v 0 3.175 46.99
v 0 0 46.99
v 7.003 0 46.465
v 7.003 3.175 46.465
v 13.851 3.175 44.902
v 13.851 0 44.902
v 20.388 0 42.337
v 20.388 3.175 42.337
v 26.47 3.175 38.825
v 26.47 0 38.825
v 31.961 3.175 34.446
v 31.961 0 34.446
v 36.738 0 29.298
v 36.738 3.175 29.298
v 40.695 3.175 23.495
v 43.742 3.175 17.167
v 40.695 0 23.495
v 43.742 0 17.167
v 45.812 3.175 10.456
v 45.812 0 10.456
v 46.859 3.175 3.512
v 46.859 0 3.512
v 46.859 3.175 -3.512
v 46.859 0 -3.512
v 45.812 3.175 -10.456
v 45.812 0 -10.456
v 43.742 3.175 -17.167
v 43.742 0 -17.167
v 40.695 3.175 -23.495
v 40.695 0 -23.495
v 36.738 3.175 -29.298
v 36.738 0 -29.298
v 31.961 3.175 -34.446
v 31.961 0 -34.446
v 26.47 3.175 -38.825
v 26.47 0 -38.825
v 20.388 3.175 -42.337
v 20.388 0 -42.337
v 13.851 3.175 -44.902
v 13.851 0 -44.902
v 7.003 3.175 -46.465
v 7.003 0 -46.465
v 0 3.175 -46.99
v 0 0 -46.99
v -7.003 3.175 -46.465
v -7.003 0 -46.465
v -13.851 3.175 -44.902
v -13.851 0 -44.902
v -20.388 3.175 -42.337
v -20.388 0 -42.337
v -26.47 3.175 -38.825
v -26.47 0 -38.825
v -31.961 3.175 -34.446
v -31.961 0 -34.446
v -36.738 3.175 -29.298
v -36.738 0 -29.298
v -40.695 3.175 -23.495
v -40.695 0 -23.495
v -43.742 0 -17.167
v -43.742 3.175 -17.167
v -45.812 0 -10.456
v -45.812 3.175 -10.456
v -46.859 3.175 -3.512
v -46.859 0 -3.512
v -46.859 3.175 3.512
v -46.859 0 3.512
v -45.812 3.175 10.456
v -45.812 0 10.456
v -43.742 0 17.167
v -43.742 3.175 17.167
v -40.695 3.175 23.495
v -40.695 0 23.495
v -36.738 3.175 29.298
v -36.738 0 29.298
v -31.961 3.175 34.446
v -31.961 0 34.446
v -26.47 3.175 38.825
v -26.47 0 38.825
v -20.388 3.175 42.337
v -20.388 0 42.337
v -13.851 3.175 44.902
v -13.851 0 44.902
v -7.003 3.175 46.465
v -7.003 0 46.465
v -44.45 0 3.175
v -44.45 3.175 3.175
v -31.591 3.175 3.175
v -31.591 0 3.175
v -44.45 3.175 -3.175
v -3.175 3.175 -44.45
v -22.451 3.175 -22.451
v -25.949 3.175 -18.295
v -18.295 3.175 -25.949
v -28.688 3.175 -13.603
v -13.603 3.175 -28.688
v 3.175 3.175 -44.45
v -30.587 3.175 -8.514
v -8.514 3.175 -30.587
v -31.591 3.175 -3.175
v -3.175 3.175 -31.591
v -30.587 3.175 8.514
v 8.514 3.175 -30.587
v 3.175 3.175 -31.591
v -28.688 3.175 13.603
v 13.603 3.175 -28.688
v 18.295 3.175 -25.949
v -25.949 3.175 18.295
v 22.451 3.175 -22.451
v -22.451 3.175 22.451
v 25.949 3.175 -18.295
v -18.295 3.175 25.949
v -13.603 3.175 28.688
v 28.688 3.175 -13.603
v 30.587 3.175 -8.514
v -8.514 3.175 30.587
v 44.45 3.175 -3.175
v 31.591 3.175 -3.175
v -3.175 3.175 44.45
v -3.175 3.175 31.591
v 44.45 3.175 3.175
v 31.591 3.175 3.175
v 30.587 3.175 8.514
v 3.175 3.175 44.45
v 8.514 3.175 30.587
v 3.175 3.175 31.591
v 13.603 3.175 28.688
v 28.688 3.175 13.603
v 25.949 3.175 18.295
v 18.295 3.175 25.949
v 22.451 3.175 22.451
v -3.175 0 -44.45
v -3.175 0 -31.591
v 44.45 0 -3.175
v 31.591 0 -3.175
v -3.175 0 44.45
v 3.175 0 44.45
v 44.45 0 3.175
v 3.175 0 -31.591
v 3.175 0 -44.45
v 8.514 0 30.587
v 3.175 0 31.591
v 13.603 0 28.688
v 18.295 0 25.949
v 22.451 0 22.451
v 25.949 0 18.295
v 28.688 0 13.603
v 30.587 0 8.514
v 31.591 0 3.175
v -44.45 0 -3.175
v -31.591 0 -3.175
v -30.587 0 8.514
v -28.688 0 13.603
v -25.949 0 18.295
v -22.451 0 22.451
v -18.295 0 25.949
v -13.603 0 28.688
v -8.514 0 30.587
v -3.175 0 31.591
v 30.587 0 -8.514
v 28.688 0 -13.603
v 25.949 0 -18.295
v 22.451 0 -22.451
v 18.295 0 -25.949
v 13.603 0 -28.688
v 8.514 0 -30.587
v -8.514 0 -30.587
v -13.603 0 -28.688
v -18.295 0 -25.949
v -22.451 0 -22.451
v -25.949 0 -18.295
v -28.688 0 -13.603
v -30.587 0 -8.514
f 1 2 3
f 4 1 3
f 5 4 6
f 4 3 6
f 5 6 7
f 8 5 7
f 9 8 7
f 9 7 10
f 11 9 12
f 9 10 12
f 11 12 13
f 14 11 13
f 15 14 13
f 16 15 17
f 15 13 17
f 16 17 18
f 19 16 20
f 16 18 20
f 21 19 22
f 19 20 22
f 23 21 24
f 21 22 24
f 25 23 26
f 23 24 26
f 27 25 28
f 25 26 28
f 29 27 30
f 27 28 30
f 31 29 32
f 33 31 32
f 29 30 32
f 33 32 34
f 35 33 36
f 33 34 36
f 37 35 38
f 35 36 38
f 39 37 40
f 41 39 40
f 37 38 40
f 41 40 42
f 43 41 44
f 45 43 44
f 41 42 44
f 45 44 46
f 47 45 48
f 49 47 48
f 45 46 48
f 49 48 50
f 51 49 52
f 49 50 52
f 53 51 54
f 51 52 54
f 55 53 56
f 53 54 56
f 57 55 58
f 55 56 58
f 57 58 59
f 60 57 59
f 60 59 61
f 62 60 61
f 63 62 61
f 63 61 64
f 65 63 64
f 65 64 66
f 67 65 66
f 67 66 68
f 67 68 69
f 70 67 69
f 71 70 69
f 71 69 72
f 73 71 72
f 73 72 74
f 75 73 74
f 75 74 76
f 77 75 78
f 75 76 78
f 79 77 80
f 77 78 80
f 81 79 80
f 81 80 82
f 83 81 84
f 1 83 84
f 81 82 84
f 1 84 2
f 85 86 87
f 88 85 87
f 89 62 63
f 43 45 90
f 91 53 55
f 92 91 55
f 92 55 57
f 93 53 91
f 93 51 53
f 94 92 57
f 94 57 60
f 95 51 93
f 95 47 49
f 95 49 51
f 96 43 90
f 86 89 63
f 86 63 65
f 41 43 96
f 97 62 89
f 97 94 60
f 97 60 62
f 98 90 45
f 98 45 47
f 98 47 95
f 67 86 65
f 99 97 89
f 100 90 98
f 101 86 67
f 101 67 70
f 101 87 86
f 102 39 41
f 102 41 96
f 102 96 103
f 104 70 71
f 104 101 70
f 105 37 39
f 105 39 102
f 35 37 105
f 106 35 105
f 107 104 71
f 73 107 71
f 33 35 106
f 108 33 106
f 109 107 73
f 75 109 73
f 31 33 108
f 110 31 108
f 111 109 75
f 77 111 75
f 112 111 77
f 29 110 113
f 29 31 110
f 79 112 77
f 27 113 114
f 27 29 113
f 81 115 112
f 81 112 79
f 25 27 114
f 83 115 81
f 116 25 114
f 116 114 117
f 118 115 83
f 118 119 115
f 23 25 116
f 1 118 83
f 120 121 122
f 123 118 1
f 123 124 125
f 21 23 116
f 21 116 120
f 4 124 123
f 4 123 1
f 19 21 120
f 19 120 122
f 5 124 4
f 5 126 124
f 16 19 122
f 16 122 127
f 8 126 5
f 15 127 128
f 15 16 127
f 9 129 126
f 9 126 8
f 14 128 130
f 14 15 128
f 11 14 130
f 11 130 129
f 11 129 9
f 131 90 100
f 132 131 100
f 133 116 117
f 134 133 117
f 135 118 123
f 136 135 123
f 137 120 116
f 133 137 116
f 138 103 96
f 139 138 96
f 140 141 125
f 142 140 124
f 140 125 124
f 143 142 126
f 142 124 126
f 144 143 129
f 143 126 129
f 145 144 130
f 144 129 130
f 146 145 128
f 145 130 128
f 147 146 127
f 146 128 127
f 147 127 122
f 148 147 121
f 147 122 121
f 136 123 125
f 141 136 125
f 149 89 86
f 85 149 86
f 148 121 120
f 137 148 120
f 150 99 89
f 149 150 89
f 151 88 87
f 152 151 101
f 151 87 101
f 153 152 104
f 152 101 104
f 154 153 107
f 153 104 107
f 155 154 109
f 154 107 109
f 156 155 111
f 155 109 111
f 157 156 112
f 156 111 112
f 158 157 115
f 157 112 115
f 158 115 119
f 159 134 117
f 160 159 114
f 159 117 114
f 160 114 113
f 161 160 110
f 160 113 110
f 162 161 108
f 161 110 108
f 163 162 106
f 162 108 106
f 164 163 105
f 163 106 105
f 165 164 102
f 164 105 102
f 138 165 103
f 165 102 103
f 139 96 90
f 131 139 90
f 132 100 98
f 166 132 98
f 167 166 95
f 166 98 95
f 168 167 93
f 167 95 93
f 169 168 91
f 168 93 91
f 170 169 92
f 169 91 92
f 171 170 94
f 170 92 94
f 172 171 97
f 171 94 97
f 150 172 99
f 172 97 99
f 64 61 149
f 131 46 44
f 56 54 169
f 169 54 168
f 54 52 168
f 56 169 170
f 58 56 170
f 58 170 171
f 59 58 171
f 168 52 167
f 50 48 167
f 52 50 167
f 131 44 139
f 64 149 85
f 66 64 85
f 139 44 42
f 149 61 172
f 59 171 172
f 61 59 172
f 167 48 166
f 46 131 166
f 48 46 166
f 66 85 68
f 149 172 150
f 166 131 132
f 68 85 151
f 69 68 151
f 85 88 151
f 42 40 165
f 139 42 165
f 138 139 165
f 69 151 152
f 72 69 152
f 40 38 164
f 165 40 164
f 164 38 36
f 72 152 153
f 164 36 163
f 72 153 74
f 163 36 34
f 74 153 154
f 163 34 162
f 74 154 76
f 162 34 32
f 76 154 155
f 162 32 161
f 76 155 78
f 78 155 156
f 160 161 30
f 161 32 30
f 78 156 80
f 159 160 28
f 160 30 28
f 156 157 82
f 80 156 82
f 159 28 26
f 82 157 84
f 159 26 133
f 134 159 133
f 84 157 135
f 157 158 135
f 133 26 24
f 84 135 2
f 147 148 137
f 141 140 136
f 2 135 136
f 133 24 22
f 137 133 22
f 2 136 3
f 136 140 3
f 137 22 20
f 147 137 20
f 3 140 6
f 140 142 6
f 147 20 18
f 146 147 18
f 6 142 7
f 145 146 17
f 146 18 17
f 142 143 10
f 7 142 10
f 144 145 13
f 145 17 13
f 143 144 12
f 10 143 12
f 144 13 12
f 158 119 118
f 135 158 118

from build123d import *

# Parameters (mm, degrees)
SKETCH1_R           = 46.99
BOSS_EXTRUDE1_DEPTH = 3.175
SKETCH2_R           = 14.351
CUT_EXTRUDE1_DEPTH  = 3.175
CUT_EXTRUDE2_DEPTH  = 7.62
SKETCH6_R           = 31.75
CUT_EXTRUDE3_DEPTH  = 5.08


with BuildPart() as part:
    # Sketch1 → Boss-Extrude1 (new body)
    with BuildSketch(Plane(origin=(0, 0, 0), x_dir=(1, 0, 0), z_dir=(0, 1, 0))):
        with Locations(Location((0, 0, 0), (0, 0, 270))):
            Circle(SKETCH1_R)
    extrude(amount=BOSS_EXTRUDE1_DEPTH)

    # Sketch2 → Cut-Extrude1 (cut)
    with BuildSketch(Plane(origin=(0, 3.175, 0), x_dir=(1, 0, 0), z_dir=(0, 1, 0))):
        with Locations(Location((0, 0, 0), (0, 0, 270))):
            Circle(SKETCH2_R)
    extrude(amount=-CUT_EXTRUDE1_DEPTH, mode=Mode.SUBTRACT)

    # Sketch5 → Cut-Extrude2 (cut)
    with BuildSketch(Plane(origin=(0, 3.175, 0), x_dir=(1, 0, 0), z_dir=(0, 1, 0))):
        with BuildLine():
            Line((3.175, 13.995376951), (3.175, 44.45))
            Line((3.175, 44.45), (-3.175, 44.45))
            Line((-3.175, 44.45), (-3.175, 13.995376951))
            ThreePointArc((-3.175, 13.995376951), (0, 14.351), (3.175, 13.995376951))
        make_face()
        with BuildLine():
            Line((3.175, -44.45), (3.175, -13.995376951))
            ThreePointArc((3.175, -13.995376951), (0, -14.351), (-3.175, -13.995376951))
            Line((-3.175, -13.995376951), (-3.175, -44.45))
            Line((-3.175, -44.45), (3.175, -44.45))
        make_face()
        with BuildLine():
            ThreePointArc((-13.995376951, -3.175), (-14.351, 0), (-13.995376951, 3.175))
            Line((-13.995376951, 3.175), (-44.45, 3.175))
            Line((-44.45, 3.175), (-44.45, -3.175))
            Line((-44.45, -3.175), (-13.995376951, -3.175))
        make_face()
        with BuildLine():
            Line((44.45, 3.175), (13.995376951, 3.175))
            ThreePointArc((13.995376951, 3.175), (14.261817129, 1.597427053), (14.351, 0))
            ThreePointArc((14.351, 0), (14.261817129, -1.597427053), (13.995376951, -3.175))
            Line((13.995376951, -3.175), (44.45, -3.175))
            Line((44.45, -3.175), (44.45, 3.175))
        make_face()
    extrude(amount=-CUT_EXTRUDE2_DEPTH, mode=Mode.SUBTRACT)

    # Sketch6 → Cut-Extrude3 (cut)
    with BuildSketch(Plane(origin=(0, 3.175, 0), x_dir=(1, 0, 0), z_dir=(0, 1, 0))):
        Circle(SKETCH6_R)
    extrude(amount=-CUT_EXTRUDE3_DEPTH, mode=Mode.SUBTRACT)


solid = part.part
